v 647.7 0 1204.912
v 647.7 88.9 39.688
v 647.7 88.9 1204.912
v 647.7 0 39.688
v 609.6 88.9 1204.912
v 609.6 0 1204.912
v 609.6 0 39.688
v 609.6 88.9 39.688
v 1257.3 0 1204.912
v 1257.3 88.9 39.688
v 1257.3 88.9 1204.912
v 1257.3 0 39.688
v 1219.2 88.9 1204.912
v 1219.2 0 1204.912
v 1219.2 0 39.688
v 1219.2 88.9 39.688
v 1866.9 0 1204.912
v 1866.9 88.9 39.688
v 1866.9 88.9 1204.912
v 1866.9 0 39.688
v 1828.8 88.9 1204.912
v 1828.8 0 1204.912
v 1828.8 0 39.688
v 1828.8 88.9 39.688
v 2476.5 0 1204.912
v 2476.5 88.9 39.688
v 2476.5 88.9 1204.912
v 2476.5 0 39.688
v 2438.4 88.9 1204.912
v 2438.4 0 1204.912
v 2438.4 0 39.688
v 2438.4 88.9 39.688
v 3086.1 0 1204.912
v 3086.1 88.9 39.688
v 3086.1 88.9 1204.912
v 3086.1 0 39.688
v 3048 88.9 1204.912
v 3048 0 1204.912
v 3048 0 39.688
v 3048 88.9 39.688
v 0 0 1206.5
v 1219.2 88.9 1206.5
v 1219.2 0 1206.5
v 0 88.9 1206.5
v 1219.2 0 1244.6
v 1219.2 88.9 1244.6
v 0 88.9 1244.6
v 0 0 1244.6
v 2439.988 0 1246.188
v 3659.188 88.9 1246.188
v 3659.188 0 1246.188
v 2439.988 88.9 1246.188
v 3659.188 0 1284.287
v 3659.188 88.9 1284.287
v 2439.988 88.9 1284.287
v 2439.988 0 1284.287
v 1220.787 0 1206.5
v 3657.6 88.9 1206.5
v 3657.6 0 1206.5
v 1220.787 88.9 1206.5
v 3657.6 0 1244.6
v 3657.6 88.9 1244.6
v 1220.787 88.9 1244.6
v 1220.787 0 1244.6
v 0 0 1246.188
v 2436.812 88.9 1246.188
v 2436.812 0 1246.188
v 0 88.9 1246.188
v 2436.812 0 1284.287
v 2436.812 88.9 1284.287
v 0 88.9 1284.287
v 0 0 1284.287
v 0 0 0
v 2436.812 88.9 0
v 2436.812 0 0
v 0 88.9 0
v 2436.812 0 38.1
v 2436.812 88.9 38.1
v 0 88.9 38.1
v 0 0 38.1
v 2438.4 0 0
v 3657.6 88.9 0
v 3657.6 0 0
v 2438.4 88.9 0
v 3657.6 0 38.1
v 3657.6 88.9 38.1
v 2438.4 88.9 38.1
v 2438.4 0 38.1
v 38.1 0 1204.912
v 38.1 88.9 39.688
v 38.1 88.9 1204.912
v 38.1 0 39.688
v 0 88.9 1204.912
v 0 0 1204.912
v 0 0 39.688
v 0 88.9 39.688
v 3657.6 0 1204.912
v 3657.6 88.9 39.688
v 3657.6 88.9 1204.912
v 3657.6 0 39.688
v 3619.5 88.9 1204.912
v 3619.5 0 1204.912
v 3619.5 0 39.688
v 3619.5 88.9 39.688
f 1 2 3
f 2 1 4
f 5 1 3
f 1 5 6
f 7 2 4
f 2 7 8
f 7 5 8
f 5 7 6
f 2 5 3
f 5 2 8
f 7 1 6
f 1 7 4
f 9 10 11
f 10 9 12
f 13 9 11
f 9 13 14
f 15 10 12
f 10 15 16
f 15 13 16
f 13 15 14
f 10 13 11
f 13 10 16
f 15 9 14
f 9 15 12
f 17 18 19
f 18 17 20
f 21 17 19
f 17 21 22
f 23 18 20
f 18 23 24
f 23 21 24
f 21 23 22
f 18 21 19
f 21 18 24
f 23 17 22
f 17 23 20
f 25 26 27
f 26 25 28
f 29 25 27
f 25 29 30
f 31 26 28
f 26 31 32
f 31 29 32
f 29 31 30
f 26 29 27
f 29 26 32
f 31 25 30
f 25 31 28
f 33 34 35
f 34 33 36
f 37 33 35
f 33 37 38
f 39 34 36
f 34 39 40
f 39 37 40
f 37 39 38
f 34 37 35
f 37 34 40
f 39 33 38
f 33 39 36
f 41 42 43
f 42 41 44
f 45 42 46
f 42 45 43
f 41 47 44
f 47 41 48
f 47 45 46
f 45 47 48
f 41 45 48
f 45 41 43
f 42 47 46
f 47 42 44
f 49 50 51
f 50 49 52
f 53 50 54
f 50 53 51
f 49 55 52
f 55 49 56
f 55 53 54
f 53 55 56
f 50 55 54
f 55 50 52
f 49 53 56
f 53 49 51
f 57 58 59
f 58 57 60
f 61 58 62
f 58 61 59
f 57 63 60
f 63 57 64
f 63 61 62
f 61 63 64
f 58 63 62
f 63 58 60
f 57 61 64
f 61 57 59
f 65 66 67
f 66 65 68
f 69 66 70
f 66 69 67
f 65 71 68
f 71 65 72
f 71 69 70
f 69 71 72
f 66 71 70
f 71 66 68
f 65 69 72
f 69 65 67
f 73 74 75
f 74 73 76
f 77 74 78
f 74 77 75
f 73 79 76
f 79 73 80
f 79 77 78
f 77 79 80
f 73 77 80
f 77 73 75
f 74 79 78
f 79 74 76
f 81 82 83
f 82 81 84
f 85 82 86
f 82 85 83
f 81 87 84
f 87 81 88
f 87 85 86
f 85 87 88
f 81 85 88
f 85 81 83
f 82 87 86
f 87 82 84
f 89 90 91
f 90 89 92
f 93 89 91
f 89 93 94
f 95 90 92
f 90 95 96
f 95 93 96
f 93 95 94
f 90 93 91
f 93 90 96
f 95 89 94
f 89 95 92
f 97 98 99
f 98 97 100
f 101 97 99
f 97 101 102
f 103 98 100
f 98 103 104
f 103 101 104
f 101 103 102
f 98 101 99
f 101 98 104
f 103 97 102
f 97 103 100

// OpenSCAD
// Dimensions of the requested wall
Wall_Dimensions = [144, 50.5];

// Dimensions of the studs to use
Stud_Dimensions = [1.5, 3.5, 96];

// On center stud spacing
Stud_Spacing = 24;

// Studs to skip.
Skip_Studs = [];

// Object spacing to avoid merging on export
Object_Spacing = 0.0625;

// Determines if middle studs are included
Include_Studs = true;

// Scale factor useful when importing to other software (ex. 25.4 for inches);
Scale_Factor = 25.4;

module wall(
    wall_dimensions,
    stud_dimensions = [1.5, 3.5, 96],
    stud_spacing = 24,
    skip_studs = [],
    object_spacing = 0.0625,
    include_studs = true) {
    length = wall_dimensions[0];
    height = wall_dimensions[1];

    stud_length = stud_dimensions[2];

    // sill plate
    plate_parts = floor(length / stud_length);
    plate_overflow = length % stud_length;

    for (i = [1:1:plate_parts]) {
        rotate([0, 90, 0])
        translate([-stud_dimensions[0], 0, (i - 1) * stud_length])
        cube([stud_dimensions[0], stud_dimensions[1], stud_dimensions[2] - object_spacing]);
    }

    if (plate_overflow > 0) {
        rotate([0, 90, 0])
        translate([-stud_dimensions[0], 0, plate_parts * stud_length])
        cube([stud_dimensions[0], stud_dimensions[1], plate_overflow]);
    }

    // studs
    // first
    translate([0, 0, stud_dimensions[0] + object_spacing])
    cube([stud_dimensions[0], stud_dimensions[1], height - (stud_dimensions[0] * 3) - (object_spacing * 2)]);

    if (include_studs) {
        // studs
        stud_count = length % stud_spacing == 0 ? (length / stud_spacing) - 1 : (length / stud_spacing);
        for (i = [1:1:stud_count]) {
            if (len(search(i, skip_studs)) == 0)
            translate([i * stud_spacing, 0, stud_dimensions[0] + object_spacing])
            cube([stud_dimensions[0], stud_dimensions[1], height - (stud_dimensions[0] * 3) - (object_spacing * 2)]);
        }
    }

    // last
    translate([length - stud_dimensions[0], 0, stud_dimensions[0] + object_spacing])
    cube([stud_dimensions[0], stud_dimensions[1], height - (stud_dimensions[0] * 3) - (object_spacing * 2)]);

    // top plates
    if (plate_overflow > 0) {
        rotate([0, 90, 0])
        translate([-height + stud_dimensions[0], 0, 0])
        cube([stud_dimensions[0], stud_dimensions[1], plate_overflow]);

        rotate([0, 90, 0])
        translate([-height - stud_dimensions[0] - object_spacing + stud_dimensions[0], 0, plate_parts * stud_length + object_spacing])
        cube([stud_dimensions[0], stud_dimensions[1], plate_overflow]);
    }

    for (i = [1:1:plate_parts]) {
        rotate([0, 90, 0])
        translate([-height + stud_dimensions[0], 0, plate_overflow + object_spacing + (i - 1) * stud_length])
        cube([stud_dimensions[0], stud_dimensions[1], stud_dimensions[2] - object_spacing]);

        rotate([0, 90, 0])
        translate([-height - stud_dimensions[0] - object_spacing + stud_dimensions[0], 0, (i - 1) * stud_length])
        cube([stud_dimensions[0], stud_dimensions[1], stud_dimensions[2] - object_spacing]);
    }
}

scale([Scale_Factor, Scale_Factor, Scale_Factor])
wall(Wall_Dimensions, Stud_Dimensions, Stud_Spacing, Skip_Studs, Object_Spacing, Include_Studs);
